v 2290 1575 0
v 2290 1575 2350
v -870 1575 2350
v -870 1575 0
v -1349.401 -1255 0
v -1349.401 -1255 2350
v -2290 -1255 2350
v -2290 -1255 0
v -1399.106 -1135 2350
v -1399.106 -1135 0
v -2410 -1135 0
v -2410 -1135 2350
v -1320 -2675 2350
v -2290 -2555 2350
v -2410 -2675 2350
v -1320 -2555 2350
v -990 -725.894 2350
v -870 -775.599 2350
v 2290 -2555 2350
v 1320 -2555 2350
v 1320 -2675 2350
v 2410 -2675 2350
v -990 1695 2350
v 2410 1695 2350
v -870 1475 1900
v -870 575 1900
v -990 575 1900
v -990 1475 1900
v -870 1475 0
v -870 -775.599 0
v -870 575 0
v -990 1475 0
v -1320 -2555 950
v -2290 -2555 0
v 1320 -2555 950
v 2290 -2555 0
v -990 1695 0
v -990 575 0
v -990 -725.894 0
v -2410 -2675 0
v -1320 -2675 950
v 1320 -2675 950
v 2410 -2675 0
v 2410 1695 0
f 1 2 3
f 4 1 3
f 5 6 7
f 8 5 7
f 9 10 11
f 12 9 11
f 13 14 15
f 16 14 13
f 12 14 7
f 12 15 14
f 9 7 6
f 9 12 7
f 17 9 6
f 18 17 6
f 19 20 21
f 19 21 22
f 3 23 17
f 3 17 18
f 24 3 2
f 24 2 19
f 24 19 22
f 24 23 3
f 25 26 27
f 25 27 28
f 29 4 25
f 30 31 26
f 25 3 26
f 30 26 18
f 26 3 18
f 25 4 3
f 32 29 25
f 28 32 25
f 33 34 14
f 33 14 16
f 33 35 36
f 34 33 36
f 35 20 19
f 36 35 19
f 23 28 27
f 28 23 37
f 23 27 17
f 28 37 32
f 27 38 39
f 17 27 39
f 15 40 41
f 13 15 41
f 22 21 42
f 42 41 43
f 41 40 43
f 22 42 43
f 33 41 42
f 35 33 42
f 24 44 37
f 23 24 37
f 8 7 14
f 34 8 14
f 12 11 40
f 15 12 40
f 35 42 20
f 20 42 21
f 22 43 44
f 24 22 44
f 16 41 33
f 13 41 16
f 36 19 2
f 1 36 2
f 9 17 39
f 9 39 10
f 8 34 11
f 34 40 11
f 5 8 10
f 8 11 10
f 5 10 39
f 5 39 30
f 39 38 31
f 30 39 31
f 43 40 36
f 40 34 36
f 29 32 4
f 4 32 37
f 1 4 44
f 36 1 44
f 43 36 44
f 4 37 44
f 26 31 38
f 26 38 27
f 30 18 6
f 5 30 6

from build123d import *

# Parameters (mm, degrees)
F1_DEPTH = 2350
F3_DEPTH = 2350.001
F4_W     = 2640
F4_H     = 1400
F5_DEPTH = 120
F6_W     = 900
F6_H     = 1900
F7_DEPTH = 120


with BuildPart() as f1:
    # F0 (on Top) → F1 (new body)
    with BuildSketch(Plane.XY):
        Polygon((-1399.106481, -1135), (-2410, -1135), (-2410, -2675), (2410, -2675), (2410, 1695), (-990, 1695), (-990, -725.893519), align=None)
    extrude(amount=F1_DEPTH)

    # F2 (on face) → F3 (cut, through all)
    with BuildSketch(Plane.XY.offset(2350)):
        Polygon((-1349.400853, -1255), (-2290, -1255), (-2290, -2555), (2290, -2555), (2290, 1575), (-870, 1575), (-870, -775.599147), align=None)
    extrude(amount=-F3_DEPTH, mode=Mode.SUBTRACT)

    # F4 (on face) → F5 (cut, through all)
    with BuildSketch(Plane.XZ.offset(2675)):
        with Locations((0, 1650)):
            Rectangle(F4_W, F4_H)
    extrude(amount=-F5_DEPTH, mode=Mode.SUBTRACT)

    # F6 (on face) → F7 (cut, through all)
    with BuildSketch(Plane.YZ.offset(-870)):
        with Locations((1025, 950)):
            Rectangle(F6_W, F6_H)
    extrude(amount=-F7_DEPTH, mode=Mode.SUBTRACT)


solid = f1.part
